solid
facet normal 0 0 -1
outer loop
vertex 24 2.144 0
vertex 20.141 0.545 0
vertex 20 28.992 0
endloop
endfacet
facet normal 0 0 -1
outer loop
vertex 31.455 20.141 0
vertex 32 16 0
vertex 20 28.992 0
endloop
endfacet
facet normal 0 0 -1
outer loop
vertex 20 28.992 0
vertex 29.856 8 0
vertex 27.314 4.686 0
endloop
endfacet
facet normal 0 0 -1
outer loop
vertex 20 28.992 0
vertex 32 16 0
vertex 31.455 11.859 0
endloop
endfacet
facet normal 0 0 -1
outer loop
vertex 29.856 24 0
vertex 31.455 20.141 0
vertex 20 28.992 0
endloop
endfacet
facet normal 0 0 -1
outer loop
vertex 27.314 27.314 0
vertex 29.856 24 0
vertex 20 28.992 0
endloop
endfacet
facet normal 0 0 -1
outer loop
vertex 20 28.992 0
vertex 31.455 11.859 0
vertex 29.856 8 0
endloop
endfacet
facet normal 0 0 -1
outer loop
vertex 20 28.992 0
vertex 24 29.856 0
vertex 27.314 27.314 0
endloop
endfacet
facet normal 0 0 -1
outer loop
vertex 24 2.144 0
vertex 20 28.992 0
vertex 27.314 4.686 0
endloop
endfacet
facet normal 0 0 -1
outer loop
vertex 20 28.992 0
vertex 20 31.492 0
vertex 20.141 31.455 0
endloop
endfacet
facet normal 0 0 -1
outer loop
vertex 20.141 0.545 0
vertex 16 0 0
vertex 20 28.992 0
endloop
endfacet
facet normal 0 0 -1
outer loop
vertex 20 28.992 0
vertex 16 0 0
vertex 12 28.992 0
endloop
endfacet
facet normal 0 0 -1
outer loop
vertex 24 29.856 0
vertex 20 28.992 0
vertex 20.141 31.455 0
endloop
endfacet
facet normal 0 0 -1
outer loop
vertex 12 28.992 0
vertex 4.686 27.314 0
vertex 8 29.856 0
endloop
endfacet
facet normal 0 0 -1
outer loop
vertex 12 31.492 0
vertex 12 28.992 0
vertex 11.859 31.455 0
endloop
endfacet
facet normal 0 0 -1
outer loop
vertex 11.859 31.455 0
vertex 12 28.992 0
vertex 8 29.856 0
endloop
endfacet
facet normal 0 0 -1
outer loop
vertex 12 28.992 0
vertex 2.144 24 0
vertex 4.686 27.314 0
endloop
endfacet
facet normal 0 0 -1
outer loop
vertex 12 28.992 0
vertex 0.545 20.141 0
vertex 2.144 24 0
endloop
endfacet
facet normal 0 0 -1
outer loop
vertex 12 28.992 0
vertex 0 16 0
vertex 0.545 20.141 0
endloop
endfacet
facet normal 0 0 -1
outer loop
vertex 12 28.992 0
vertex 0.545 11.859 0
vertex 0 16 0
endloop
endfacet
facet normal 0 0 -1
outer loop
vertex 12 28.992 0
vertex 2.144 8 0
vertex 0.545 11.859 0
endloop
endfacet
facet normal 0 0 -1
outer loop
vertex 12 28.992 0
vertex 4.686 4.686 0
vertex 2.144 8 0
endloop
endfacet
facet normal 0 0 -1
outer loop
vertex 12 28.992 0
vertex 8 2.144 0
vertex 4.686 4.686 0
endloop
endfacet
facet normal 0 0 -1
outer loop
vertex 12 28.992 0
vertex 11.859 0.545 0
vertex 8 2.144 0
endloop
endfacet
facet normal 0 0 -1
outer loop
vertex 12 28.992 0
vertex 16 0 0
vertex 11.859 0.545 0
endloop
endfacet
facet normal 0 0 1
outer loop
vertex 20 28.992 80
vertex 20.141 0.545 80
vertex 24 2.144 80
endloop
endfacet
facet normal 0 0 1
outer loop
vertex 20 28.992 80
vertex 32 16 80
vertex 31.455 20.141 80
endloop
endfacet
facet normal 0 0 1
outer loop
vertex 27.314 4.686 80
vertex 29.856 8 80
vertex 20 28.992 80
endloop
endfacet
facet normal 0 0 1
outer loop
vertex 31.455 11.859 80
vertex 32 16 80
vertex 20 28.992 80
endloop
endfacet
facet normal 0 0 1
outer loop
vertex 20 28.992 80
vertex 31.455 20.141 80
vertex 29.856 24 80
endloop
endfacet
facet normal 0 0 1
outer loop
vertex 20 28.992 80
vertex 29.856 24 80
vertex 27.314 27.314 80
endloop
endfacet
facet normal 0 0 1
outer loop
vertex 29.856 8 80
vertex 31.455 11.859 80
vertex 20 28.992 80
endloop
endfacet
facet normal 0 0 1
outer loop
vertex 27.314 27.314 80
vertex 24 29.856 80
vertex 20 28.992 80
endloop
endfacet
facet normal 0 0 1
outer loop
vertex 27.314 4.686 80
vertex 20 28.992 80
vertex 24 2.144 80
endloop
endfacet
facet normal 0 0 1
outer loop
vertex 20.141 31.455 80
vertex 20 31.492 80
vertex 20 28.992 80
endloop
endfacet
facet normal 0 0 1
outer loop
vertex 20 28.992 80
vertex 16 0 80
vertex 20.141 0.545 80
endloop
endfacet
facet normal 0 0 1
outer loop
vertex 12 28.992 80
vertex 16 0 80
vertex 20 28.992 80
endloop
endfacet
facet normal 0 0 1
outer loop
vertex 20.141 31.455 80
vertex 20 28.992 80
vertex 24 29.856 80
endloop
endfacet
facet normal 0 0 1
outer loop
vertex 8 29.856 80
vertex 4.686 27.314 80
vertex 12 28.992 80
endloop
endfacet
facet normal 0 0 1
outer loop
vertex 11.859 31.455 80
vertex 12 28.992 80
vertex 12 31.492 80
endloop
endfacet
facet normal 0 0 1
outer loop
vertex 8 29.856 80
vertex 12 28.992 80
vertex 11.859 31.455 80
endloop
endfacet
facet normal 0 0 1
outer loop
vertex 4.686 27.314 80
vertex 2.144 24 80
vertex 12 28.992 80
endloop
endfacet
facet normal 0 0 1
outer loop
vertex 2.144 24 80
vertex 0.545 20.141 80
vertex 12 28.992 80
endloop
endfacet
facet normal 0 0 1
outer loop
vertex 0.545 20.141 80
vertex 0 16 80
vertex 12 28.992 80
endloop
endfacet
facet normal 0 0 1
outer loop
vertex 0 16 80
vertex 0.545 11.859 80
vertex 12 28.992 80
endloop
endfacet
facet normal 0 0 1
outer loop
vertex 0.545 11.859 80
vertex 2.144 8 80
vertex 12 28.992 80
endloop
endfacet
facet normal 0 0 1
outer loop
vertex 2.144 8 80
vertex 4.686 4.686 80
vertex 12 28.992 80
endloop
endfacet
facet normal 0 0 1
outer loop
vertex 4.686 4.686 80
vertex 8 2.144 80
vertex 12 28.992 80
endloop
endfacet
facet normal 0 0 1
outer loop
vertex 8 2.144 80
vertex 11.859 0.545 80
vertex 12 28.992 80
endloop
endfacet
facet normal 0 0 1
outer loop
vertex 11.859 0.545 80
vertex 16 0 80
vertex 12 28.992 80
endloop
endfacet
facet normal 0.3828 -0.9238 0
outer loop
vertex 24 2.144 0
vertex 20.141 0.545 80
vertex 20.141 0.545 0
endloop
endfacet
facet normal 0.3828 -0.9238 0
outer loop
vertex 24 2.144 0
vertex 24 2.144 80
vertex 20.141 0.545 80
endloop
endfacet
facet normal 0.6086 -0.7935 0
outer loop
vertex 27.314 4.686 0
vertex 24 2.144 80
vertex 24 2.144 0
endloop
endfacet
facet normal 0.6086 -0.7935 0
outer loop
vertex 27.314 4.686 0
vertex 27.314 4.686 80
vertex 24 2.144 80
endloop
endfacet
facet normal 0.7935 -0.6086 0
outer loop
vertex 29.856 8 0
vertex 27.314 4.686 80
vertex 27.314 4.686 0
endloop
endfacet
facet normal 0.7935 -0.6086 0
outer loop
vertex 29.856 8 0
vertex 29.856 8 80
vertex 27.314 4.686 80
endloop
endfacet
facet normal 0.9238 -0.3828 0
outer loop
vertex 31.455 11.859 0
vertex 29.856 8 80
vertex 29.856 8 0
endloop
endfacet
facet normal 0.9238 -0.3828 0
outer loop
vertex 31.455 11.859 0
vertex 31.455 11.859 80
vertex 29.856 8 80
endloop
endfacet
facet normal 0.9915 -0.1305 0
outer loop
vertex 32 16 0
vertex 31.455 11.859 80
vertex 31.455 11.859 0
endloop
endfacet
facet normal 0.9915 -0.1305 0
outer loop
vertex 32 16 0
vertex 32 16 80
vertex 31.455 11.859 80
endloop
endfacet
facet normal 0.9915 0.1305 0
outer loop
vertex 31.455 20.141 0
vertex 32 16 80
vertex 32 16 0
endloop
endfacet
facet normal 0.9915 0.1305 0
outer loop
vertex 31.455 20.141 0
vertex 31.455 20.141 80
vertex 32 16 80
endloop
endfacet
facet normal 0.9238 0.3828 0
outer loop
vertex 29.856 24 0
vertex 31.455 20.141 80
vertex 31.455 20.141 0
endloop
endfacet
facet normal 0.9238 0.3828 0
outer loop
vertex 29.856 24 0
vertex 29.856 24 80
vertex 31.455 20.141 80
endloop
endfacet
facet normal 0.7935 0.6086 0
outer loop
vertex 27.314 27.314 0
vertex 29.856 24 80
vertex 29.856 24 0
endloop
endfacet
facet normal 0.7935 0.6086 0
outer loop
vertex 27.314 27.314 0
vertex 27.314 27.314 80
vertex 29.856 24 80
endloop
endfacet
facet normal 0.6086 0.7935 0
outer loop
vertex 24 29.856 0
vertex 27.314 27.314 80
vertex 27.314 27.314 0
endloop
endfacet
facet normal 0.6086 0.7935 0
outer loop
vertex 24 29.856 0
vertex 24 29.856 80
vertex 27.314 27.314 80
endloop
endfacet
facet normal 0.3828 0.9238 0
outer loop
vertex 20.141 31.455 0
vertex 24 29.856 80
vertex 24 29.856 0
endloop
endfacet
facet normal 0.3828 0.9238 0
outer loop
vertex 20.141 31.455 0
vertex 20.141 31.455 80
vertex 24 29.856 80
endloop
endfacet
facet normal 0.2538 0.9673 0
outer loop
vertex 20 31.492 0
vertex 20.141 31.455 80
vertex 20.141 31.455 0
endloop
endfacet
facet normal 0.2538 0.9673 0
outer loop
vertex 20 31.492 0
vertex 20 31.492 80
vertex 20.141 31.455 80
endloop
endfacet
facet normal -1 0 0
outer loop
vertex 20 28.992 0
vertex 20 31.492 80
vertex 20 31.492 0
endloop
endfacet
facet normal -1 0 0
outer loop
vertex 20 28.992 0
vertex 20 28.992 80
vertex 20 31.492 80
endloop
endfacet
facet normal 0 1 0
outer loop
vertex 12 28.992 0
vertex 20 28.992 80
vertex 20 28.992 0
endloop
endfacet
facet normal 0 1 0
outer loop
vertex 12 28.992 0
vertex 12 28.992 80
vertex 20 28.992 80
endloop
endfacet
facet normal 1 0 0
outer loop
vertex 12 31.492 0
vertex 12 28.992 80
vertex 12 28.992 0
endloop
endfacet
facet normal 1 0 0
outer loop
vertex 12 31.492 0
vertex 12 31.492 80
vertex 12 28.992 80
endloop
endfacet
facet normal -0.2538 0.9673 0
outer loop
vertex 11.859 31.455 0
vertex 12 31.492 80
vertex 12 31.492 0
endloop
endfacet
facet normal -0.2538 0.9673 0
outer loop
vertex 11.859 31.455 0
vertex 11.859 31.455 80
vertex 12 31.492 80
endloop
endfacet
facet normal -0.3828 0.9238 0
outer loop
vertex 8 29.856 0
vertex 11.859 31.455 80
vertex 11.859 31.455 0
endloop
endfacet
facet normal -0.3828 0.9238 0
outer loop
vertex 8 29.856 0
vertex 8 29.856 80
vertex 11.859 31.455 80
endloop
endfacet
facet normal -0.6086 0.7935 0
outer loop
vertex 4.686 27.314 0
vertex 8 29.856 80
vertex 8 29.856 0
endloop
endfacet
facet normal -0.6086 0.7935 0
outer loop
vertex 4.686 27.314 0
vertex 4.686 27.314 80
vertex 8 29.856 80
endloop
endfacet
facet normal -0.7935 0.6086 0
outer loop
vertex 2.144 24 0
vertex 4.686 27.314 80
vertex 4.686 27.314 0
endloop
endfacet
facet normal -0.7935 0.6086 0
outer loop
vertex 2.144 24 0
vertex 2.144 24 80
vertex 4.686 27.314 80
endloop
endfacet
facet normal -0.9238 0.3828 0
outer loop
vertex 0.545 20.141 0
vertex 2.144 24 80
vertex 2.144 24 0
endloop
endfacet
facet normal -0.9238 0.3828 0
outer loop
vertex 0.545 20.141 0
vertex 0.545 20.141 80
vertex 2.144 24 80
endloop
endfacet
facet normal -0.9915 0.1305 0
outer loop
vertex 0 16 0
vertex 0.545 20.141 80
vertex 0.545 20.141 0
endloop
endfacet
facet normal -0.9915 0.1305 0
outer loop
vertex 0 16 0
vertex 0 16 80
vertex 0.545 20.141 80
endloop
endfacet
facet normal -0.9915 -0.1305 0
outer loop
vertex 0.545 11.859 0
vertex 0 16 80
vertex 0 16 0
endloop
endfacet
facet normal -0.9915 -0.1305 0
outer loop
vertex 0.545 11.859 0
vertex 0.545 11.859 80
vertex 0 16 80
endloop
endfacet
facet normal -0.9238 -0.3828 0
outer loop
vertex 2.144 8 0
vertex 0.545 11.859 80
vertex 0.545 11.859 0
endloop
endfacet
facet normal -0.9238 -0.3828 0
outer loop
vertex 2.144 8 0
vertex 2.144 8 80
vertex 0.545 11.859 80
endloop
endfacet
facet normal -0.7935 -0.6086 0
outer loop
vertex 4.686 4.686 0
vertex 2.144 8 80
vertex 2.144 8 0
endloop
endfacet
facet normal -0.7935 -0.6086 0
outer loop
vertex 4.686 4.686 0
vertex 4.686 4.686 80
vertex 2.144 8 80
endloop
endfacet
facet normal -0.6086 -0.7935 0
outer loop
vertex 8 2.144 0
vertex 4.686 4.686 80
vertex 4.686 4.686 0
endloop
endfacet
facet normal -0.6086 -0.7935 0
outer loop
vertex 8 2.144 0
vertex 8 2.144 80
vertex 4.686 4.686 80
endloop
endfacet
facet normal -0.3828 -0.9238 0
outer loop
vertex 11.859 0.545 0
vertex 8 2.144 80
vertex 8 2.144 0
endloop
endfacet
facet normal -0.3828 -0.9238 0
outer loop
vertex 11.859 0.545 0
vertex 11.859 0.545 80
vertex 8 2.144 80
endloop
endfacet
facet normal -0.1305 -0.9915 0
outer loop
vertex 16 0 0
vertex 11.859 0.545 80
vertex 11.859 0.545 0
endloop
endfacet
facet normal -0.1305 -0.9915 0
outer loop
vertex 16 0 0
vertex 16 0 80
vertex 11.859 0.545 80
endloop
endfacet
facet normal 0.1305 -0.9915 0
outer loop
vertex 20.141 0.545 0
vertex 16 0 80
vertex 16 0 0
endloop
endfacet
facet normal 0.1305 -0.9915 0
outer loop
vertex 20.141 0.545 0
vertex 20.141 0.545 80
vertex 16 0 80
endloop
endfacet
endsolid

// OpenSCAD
$fn = 32;

// ----------------------------------------------------------------------
// Keyway shaft: d32 shaft, key 8 x 2.5 mm
// ----------------------------------------------------------------------

// --- parameters (mm) ---
shaft_r = 16;             // shaft radius
key_w = 8;                // keyway width
key_d = 2.5;              // keyway depth below the surface line
plate_t = 80;             // shaft length, Z (extrusion height)

shaft_d = 2 * shaft_r;  // shaft diameter
circle_step = 15;  // polygon sampling step, degrees

profile = [[11.859, 31.455], [8, 29.856], [4.686, 27.314], [2.144, 24], [0.545, 20.141], [0, 16], [0.545, 11.859], [2.144, 8], [4.686, 4.686], [8, 2.144], [11.859, 0.545], [16, 0], [20.141, 0.545], [24, 2.144], [27.314, 4.686], [29.856, 8], [31.455, 11.859], [32, 16], [31.455, 20.141], [29.856, 24], [27.314, 27.314], [24, 29.856], [20.141, 31.455], [20, 31.492], [20, 28.992], [12, 28.992], [12, 31.492]];  // primary outline, 27 points, counter clockwise

// --- the one profile operation ---
linear_extrude(height = plate_t) polygon(points = profile);
